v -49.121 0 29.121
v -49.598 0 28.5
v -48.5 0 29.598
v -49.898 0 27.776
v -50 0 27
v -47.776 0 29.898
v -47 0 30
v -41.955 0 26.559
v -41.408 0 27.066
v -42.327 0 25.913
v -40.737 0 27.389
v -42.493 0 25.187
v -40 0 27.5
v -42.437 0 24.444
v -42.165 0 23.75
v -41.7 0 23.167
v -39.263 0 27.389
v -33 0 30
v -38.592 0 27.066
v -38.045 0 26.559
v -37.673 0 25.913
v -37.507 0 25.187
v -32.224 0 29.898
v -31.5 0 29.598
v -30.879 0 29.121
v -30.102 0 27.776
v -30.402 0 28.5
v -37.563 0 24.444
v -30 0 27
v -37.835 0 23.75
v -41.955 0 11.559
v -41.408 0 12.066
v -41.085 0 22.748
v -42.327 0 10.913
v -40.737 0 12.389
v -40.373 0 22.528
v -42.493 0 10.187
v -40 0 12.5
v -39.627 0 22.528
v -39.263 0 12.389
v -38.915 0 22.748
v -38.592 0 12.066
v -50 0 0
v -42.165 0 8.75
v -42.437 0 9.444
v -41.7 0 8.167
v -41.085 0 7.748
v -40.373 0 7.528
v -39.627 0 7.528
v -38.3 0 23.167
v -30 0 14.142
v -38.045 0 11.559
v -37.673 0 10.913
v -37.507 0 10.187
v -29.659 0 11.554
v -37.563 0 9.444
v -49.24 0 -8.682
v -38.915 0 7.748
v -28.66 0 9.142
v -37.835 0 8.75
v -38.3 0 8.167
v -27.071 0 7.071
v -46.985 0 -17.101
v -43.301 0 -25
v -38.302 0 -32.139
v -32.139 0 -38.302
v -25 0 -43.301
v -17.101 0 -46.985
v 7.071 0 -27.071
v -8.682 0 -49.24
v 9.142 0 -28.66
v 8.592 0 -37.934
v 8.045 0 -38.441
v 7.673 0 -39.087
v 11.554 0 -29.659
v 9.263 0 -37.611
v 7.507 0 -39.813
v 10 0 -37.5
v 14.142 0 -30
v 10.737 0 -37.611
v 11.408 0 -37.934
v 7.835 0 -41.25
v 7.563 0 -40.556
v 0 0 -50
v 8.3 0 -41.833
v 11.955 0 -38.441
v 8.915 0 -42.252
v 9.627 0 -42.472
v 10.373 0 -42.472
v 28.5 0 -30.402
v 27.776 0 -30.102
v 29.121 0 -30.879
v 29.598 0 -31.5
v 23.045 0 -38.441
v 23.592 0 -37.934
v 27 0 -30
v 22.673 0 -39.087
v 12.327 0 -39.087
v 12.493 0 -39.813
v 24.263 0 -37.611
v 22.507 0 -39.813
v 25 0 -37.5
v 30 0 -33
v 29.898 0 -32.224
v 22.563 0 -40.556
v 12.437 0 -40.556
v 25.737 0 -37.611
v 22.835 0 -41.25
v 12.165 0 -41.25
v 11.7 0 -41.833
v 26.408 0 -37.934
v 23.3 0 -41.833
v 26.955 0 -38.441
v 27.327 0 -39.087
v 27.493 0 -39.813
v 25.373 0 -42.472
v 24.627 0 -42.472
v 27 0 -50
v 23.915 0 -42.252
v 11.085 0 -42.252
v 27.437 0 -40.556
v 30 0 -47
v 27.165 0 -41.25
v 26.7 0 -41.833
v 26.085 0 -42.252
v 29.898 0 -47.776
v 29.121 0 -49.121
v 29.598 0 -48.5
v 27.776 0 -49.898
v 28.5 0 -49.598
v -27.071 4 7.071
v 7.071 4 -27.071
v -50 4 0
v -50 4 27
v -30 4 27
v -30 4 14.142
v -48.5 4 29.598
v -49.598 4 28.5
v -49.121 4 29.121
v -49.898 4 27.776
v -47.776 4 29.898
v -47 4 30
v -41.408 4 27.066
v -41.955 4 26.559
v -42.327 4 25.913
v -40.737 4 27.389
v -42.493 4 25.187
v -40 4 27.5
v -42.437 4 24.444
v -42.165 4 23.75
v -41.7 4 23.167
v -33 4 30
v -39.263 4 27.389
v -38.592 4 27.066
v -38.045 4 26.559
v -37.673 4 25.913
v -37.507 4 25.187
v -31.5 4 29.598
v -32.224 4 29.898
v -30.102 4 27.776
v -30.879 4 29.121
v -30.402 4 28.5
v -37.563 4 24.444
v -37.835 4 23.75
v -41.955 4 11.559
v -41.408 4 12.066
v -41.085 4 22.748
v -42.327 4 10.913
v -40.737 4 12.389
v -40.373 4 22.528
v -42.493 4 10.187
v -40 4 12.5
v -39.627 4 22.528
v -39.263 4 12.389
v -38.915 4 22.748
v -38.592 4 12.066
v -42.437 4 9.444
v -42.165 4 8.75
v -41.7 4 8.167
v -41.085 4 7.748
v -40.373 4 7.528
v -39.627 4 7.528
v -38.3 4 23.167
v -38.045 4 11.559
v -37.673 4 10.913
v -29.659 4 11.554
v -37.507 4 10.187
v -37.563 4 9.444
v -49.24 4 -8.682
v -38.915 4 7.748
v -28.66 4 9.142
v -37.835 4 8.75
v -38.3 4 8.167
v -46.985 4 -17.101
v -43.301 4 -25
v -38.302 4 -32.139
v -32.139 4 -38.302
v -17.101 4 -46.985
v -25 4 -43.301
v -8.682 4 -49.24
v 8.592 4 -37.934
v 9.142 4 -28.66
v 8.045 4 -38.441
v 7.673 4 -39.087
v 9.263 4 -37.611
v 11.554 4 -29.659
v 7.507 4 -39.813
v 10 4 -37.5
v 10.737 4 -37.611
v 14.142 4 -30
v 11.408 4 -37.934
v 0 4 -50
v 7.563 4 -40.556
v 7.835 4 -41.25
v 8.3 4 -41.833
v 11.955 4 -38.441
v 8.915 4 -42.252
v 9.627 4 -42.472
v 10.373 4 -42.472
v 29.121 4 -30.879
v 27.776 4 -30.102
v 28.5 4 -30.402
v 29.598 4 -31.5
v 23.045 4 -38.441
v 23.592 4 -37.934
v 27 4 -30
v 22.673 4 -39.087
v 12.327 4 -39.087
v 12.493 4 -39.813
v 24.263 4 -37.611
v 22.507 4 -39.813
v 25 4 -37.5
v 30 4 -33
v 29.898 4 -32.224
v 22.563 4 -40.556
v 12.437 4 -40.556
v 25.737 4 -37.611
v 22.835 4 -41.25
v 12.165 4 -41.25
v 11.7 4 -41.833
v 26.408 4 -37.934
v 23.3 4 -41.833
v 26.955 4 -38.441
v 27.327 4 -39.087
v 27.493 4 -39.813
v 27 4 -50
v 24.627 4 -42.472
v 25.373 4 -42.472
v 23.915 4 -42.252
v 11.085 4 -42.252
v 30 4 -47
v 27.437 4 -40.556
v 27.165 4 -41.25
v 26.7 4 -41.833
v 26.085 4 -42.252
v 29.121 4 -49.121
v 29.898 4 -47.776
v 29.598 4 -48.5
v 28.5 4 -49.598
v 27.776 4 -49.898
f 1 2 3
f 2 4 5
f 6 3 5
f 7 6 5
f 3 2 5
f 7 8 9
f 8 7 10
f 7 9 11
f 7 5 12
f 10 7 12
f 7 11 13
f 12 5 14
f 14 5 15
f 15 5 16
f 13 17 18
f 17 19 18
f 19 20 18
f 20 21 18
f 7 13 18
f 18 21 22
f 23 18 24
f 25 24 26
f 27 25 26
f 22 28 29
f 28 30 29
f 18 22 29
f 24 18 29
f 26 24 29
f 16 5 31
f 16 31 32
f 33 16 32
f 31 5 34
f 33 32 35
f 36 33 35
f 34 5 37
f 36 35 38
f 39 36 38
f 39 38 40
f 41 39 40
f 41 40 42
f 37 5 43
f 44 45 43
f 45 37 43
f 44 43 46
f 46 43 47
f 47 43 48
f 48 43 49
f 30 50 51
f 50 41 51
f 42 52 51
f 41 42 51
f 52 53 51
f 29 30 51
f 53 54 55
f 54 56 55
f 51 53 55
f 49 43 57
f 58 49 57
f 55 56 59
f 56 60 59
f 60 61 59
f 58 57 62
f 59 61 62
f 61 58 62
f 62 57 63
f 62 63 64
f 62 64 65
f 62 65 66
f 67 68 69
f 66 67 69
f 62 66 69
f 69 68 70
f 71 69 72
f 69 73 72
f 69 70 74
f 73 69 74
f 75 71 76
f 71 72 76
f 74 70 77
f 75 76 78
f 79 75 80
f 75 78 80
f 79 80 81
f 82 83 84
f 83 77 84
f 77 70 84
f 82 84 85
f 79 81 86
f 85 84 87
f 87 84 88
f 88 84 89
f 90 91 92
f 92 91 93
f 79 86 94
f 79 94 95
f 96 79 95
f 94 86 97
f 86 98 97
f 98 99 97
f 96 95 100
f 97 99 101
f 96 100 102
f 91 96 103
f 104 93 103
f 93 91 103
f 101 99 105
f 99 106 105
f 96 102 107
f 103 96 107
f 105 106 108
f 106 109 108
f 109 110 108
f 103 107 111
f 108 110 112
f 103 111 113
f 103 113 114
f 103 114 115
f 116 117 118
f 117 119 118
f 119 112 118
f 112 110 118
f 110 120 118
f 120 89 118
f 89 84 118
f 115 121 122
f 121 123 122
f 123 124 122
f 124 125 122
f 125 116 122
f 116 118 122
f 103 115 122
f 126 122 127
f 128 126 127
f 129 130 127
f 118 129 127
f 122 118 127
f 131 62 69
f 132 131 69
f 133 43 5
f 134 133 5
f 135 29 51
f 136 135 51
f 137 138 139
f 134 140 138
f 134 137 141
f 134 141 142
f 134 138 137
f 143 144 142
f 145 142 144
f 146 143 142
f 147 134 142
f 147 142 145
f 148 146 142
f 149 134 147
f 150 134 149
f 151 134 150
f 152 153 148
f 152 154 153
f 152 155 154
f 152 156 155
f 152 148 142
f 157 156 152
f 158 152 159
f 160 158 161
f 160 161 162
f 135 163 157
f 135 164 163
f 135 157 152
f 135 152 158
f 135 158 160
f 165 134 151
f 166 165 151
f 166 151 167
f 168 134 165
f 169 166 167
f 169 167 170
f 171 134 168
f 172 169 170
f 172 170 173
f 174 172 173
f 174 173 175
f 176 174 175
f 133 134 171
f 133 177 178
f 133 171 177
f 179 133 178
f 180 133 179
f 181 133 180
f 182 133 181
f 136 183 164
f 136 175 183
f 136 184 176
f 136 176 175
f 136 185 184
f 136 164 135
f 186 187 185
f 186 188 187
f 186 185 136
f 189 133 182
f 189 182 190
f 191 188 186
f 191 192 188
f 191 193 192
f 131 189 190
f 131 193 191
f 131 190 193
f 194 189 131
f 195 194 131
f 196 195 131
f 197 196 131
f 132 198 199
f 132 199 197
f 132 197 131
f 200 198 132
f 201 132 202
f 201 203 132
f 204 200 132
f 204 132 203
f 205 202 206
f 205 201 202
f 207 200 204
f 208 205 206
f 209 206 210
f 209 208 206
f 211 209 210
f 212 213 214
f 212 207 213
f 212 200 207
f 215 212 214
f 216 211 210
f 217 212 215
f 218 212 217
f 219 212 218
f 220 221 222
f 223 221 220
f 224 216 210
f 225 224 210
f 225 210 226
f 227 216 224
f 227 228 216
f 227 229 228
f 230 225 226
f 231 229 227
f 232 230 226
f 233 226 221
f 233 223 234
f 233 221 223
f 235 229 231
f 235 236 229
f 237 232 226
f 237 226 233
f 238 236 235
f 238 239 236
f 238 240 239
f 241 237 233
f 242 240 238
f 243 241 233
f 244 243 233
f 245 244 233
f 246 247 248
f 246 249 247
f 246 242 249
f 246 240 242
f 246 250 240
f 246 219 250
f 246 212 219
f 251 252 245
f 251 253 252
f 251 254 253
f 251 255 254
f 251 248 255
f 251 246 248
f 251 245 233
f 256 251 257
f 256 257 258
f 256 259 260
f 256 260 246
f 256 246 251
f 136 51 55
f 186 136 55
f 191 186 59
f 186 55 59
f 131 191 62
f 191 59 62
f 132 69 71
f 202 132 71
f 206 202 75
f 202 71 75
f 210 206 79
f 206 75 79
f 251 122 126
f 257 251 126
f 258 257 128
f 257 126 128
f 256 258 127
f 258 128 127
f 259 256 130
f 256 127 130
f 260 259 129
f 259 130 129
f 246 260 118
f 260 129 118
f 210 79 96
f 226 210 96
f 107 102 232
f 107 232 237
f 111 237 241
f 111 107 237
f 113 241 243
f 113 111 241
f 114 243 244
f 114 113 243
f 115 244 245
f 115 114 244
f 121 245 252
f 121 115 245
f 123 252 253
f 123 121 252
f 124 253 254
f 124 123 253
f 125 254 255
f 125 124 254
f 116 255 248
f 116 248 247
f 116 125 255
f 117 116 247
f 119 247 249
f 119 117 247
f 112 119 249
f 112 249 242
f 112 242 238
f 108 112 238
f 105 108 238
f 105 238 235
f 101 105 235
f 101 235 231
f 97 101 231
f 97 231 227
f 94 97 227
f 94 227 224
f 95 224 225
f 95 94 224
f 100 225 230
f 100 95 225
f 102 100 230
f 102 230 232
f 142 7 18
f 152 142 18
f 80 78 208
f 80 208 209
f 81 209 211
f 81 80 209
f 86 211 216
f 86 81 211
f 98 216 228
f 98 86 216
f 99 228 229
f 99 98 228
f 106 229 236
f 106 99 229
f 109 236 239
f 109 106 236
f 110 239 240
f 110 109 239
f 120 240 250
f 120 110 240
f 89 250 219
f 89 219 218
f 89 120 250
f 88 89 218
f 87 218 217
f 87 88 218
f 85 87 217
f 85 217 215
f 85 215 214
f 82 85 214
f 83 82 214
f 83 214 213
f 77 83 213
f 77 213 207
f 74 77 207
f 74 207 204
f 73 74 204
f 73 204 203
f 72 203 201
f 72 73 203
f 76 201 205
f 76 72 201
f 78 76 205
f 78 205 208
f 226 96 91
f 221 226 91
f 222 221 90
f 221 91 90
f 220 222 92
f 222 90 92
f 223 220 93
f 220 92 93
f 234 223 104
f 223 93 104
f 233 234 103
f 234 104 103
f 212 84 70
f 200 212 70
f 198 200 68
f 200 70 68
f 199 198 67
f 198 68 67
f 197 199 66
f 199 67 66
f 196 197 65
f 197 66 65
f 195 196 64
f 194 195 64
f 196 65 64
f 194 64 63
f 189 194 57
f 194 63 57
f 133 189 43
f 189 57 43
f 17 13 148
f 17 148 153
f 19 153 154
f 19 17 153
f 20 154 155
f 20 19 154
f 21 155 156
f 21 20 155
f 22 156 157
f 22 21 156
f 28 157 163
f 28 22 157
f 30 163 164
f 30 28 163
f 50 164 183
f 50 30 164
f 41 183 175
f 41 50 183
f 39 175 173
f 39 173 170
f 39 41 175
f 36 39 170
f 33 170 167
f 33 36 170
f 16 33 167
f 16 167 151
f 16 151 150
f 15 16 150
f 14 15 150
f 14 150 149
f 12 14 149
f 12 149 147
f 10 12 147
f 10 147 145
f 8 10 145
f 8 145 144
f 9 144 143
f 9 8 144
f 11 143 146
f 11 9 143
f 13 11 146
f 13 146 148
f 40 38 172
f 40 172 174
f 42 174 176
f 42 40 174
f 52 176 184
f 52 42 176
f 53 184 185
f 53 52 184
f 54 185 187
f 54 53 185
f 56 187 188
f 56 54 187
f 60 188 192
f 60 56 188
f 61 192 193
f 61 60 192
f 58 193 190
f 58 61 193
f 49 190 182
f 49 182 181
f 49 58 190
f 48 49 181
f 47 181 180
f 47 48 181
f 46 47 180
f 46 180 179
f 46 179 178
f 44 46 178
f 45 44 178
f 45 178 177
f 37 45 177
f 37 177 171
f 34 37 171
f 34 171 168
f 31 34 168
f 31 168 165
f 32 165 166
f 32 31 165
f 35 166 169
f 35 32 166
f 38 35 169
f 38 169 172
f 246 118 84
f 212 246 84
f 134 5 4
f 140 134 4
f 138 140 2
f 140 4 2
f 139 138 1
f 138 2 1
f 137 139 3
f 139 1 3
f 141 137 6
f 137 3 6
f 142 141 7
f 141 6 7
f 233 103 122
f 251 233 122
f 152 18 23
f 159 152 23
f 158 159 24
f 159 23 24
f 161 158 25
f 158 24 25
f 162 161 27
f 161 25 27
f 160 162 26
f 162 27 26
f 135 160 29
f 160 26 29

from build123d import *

# Parameters (mm, degrees)
SKETCH1_R           = 2.5
BOSS_EXTRUDE1_DEPTH = 4


with BuildPart() as part:
    # Sketch1 → Boss-Extrude1 (new body)
    with BuildSketch(Plane(origin=(0, 0, 0), x_dir=(1, 0, 0), z_dir=(0, 1, 0))):
        with BuildLine():
            Line((-50, 0), (-50, -27))
            ThreePointArc((-50, -27), (-49.121320344, -29.121320344), (-47, -30))
            Line((-47, -30), (-33, -30))
            ThreePointArc((-33, -30), (-30.878679656, -29.121320344), (-30, -27))
            Line((-30, -27), (-30, -14.142135624))
            ThreePointArc((-30, -14.142135624), (-29.238795325, -10.3153013), (-27.071067812, -7.071067812))
            Line((-27.071067812, -7.071067812), (7.071067812, 27.071067812))
            ThreePointArc((7.071067812, 27.071067812), (10.3153013, 29.238795325), (14.142135624, 30))
            Line((14.142135624, 30), (27, 30))
            ThreePointArc((27, 30), (29.121320344, 30.878679656), (30, 33))
            Line((30, 33), (30, 47))
            ThreePointArc((30, 47), (29.121320344, 49.121320344), (27, 50))
            Line((27, 50), (0, 50))
            ThreePointArc((0, 50), (-35.355339059, 35.355339059), (-50, 0))
        make_face()
        with Locations(Location((-40, -10, 0), (0, 0, 270))):
            Circle(SKETCH1_R, mode=Mode.SUBTRACT)
        with Locations(Location((-40, -25, 0), (0, 0, 270))):
            Circle(SKETCH1_R, mode=Mode.SUBTRACT)
        with Locations(Location((10, 40, 0), (0, 0, 270))):
            Circle(SKETCH1_R, mode=Mode.SUBTRACT)
        with Locations(Location((25, 40, 0), (0, 0, 270))):
            Circle(SKETCH1_R, mode=Mode.SUBTRACT)
    extrude(amount=BOSS_EXTRUDE1_DEPTH)


solid = part.part
